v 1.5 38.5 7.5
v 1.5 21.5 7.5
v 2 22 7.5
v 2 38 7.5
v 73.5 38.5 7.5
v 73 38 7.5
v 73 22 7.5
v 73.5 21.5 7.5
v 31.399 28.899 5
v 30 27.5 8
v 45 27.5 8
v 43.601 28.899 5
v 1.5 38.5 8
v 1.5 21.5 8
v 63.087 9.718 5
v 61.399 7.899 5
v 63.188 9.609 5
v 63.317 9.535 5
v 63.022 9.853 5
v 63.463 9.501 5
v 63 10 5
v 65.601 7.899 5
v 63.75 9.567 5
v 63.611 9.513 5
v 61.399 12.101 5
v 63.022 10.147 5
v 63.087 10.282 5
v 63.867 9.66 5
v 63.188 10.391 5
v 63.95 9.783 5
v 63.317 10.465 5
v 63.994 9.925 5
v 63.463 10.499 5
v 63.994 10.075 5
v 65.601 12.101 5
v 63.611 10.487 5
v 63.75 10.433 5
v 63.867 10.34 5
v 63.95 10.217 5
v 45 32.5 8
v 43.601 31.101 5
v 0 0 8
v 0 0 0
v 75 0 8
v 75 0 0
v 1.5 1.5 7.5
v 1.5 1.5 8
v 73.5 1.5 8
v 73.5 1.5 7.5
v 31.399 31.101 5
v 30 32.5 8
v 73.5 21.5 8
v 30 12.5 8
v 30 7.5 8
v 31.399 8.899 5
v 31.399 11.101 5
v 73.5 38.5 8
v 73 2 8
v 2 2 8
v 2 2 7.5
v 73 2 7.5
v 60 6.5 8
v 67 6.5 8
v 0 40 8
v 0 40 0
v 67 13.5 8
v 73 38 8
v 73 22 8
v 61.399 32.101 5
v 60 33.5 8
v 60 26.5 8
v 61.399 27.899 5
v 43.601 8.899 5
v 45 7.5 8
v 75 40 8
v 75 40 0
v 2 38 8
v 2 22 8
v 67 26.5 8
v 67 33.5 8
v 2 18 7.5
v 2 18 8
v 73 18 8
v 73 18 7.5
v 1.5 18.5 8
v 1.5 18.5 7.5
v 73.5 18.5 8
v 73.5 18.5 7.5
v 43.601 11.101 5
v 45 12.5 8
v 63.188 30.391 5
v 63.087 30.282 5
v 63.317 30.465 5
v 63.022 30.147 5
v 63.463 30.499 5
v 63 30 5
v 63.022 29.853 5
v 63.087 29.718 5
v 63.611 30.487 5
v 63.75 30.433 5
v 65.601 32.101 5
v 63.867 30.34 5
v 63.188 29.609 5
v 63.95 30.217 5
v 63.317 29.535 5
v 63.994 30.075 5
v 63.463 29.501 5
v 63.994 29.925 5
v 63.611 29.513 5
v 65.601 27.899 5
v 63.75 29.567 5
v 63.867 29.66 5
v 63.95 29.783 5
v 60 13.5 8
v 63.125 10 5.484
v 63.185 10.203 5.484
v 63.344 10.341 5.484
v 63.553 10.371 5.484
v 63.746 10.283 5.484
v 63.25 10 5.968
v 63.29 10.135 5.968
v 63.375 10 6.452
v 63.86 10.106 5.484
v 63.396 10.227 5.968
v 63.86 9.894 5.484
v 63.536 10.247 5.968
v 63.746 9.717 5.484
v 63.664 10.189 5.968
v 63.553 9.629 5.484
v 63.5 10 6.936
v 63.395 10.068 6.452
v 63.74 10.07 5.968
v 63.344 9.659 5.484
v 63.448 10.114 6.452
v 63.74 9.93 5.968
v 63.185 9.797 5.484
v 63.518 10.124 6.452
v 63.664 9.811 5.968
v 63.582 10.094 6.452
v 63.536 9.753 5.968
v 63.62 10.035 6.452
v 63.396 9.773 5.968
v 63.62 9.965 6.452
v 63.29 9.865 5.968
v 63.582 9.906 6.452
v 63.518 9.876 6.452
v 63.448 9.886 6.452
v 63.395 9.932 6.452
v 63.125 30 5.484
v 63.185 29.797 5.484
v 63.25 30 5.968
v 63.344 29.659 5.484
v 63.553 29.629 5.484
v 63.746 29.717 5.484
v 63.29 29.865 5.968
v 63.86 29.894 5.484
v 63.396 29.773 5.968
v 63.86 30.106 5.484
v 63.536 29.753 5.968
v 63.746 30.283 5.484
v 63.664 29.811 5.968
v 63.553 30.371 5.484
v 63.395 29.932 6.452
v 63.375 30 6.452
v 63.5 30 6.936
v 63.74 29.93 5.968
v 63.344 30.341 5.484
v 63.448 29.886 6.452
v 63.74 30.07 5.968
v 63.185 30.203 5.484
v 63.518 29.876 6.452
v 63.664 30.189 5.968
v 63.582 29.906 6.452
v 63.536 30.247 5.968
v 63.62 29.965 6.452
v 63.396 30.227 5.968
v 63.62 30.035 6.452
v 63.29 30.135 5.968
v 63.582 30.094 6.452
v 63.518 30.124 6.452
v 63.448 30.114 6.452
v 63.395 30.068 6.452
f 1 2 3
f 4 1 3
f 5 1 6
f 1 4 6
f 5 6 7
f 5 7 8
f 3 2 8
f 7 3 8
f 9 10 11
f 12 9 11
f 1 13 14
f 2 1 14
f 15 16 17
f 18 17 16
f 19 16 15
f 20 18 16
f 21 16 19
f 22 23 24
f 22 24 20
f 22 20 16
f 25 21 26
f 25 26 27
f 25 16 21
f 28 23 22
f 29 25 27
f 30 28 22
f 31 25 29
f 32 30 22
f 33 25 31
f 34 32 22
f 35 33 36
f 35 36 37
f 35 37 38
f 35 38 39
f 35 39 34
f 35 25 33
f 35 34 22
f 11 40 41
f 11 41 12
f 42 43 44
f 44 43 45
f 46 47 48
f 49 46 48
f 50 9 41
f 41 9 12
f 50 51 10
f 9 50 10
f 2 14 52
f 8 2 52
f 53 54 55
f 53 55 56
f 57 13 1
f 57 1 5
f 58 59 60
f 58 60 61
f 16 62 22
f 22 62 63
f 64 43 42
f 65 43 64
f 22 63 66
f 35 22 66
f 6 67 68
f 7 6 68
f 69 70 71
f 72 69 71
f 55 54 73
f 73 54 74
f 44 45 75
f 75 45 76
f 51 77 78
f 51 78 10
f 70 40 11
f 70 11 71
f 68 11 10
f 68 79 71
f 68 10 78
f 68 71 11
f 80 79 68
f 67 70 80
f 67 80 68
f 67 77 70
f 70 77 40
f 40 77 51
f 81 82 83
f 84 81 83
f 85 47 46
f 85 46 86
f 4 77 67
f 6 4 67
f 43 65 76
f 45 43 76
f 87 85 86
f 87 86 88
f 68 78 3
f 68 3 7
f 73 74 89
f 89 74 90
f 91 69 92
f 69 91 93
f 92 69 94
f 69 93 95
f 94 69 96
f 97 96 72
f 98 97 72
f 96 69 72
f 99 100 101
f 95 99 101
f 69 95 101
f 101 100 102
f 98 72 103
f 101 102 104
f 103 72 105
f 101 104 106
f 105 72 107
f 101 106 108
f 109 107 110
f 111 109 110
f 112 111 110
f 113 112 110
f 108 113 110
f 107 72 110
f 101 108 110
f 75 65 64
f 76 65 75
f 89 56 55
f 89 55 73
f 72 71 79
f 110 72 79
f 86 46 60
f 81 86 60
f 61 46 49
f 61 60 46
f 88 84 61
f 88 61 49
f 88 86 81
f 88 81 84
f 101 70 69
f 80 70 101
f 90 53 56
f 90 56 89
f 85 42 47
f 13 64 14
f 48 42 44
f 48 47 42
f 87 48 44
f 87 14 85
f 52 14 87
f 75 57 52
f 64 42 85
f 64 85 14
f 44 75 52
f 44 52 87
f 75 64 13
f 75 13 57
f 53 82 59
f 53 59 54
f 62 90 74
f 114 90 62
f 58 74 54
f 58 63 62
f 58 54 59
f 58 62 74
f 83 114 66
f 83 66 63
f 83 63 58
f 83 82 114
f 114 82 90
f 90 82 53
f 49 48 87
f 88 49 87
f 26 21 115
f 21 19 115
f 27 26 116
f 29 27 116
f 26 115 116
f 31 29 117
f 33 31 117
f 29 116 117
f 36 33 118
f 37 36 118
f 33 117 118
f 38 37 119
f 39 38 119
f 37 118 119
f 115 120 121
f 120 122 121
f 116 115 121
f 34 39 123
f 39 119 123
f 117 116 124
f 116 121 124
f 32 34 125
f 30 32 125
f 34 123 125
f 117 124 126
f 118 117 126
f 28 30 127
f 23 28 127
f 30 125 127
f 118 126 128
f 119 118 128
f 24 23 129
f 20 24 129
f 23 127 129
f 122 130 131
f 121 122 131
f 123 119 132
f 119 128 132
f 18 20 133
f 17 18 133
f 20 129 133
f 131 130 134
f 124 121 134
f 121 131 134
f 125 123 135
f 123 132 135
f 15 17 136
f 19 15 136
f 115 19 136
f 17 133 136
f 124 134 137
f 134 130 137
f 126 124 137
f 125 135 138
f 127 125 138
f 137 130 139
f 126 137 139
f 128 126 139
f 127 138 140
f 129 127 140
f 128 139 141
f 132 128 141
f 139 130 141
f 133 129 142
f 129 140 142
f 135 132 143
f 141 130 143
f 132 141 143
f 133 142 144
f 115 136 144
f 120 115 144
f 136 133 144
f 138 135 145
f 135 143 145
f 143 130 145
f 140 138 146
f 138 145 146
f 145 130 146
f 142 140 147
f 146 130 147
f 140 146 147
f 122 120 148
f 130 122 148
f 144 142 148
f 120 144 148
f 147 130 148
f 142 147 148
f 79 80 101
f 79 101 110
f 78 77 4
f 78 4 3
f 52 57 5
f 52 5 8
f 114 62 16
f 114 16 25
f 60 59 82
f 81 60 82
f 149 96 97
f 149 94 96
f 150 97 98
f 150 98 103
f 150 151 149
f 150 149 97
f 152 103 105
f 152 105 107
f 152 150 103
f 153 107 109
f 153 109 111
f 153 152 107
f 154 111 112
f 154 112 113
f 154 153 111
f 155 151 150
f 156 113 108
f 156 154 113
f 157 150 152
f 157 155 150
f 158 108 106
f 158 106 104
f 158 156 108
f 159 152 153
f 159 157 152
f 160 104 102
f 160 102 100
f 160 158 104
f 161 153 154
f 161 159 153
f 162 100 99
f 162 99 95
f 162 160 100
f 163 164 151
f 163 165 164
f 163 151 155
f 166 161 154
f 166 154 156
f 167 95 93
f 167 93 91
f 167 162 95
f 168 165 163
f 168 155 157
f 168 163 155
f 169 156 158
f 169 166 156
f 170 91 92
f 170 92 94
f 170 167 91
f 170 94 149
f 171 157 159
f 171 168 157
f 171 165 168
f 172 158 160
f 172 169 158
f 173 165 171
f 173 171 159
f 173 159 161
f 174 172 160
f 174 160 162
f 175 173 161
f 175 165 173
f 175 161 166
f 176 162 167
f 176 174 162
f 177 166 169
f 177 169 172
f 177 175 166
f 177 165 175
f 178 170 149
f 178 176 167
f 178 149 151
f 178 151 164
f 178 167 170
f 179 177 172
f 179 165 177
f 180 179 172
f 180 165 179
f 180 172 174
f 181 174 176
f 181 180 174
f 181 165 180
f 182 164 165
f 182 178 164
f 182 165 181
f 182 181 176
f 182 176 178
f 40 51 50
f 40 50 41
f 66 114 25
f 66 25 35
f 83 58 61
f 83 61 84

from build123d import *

# Parameters (mm, degrees)
SKETCH1_W                 = 75
SKETCH1_H                 = 40
BOSS_EXTRUDE1_DEPTH       = 8
SKETCH2_W                 = 72
SKETCH2_H                 = 17
SKETCH2_W_2               = 71
SKETCH2_H_2               = 16
CUT_EXTRUDE1_DEPTH        = 0.5
SKETCH3_W                 = 15
SKETCH3_H                 = 5
SKETCH3_W_2               = 7
SKETCH3_H_2               = 7
CUT_EXTRUDE3_DEPTH        = 3
DRAFT4_ANGLE              = 25
DRAFT5_ANGLE              = 25
DRAFT4_OF_MIRROR1_2_ANGLE = 25
DRAFT5_OF_MIRROR1_2_ANGLE = 25


with BuildPart() as part:
    # Sketch1 → Boss-Extrude1 (new body)
    with BuildSketch(Plane.XY):
        with Locations((37.5, 20)):
            Rectangle(SKETCH1_W, SKETCH1_H)
    extrude(amount=BOSS_EXTRUDE1_DEPTH)

    # Sketch2 → Cut-Extrude1 (cut)
    with BuildSketch(Plane.XY.offset(8)):
        with Locations((37.5, 10)):
            Rectangle(SKETCH2_W, SKETCH2_H)
        with Locations((37.5, 10)):
            Rectangle(SKETCH2_W_2, SKETCH2_H_2, mode=Mode.SUBTRACT)
    cut_extrude1 = extrude(amount=-CUT_EXTRUDE1_DEPTH, mode=Mode.SUBTRACT)

    # Sketch3 → Cut-Extrude3 (cut)
    with BuildSketch(Plane.XY.offset(8)):
        with Locations((37.5, 10)):
            Rectangle(SKETCH3_W, SKETCH3_H)
        with Locations((63.5, 10)):
            Rectangle(SKETCH3_W_2, SKETCH3_H_2)
    cut_extrude3 = extrude(amount=-CUT_EXTRUDE3_DEPTH, mode=Mode.SUBTRACT)

    # Draft4
    draft4_faces = [part.faces().sort_by_distance(p)[0] for p in [
        (45, 10, 6.5),
        (37.5, 7.5, 6.5),
        (30, 10, 6.5),
        (37.5, 12.5, 6.5),
    ]]
    draft(draft4_faces, Plane.XY.offset(8), DRAFT4_ANGLE)

    # Draft5
    draft5_faces = [part.faces().sort_by_distance(p)[0] for p in [
        (67, 10, 6.5),
        (63.5, 6.5, 6.5),
        (60, 10, 6.5),
        (63.5, 13.5, 6.5),
    ]]
    draft(draft5_faces, Plane.XY.offset(8), DRAFT5_ANGLE)

    # Sketch7 → Revolve2 (revolve)
    with BuildSketch(Plane(origin=(63.5, 0, 0), x_dir=(0, 0, -1), z_dir=(1, 0, 0)), mode=Mode.PRIVATE) as revolve2_sk:
        Polygon((-5, 10), (-5, 9.5), (-6.936491673, 10), align=None)
    revolve2 = revolve(revolve2_sk.sketch.rotate(Axis((63.5, 10, 6.936491673), (0, 0, -1)), 90), axis=Axis((63.5, 10, 6.936491673), (0, 0, -1)))

    # Mirror1: Cut-Extrude1, Cut-Extrude3, Revolve2 across plane
    add(cut_extrude1.mirror(Plane.ZX.offset(20)), mode=Mode.SUBTRACT)
    add(cut_extrude3.mirror(Plane.ZX.offset(20)), mode=Mode.SUBTRACT)
    add(revolve2.mirror(Plane.ZX.offset(20)))

    # Draft4 of Mirror1 2
    draft4_of_mirror1_2_faces = [part.faces().sort_by_distance(p)[0] for p in [
        (45, 30, 6.5),
        (37.5, 32.5, 6.5),
        (30, 30, 6.5),
        (37.5, 27.5, 6.5),
    ]]
    draft(draft4_of_mirror1_2_faces, Plane(origin=(0, 40, 8), x_dir=(1, 0, 0), z_dir=(0, 0, 1)), DRAFT4_OF_MIRROR1_2_ANGLE)

    # Draft5 of Mirror1 2
    draft5_of_mirror1_2_faces = [part.faces().sort_by_distance(p)[0] for p in [
        (67, 30, 6.5),
        (63.5, 33.5, 6.5),
        (60, 30, 6.5),
        (63.5, 26.5, 6.5),
    ]]
    draft(draft5_of_mirror1_2_faces, Plane(origin=(0, 40, 8), x_dir=(1, 0, 0), z_dir=(0, 0, 1)), DRAFT5_OF_MIRROR1_2_ANGLE)


solid = part.part
